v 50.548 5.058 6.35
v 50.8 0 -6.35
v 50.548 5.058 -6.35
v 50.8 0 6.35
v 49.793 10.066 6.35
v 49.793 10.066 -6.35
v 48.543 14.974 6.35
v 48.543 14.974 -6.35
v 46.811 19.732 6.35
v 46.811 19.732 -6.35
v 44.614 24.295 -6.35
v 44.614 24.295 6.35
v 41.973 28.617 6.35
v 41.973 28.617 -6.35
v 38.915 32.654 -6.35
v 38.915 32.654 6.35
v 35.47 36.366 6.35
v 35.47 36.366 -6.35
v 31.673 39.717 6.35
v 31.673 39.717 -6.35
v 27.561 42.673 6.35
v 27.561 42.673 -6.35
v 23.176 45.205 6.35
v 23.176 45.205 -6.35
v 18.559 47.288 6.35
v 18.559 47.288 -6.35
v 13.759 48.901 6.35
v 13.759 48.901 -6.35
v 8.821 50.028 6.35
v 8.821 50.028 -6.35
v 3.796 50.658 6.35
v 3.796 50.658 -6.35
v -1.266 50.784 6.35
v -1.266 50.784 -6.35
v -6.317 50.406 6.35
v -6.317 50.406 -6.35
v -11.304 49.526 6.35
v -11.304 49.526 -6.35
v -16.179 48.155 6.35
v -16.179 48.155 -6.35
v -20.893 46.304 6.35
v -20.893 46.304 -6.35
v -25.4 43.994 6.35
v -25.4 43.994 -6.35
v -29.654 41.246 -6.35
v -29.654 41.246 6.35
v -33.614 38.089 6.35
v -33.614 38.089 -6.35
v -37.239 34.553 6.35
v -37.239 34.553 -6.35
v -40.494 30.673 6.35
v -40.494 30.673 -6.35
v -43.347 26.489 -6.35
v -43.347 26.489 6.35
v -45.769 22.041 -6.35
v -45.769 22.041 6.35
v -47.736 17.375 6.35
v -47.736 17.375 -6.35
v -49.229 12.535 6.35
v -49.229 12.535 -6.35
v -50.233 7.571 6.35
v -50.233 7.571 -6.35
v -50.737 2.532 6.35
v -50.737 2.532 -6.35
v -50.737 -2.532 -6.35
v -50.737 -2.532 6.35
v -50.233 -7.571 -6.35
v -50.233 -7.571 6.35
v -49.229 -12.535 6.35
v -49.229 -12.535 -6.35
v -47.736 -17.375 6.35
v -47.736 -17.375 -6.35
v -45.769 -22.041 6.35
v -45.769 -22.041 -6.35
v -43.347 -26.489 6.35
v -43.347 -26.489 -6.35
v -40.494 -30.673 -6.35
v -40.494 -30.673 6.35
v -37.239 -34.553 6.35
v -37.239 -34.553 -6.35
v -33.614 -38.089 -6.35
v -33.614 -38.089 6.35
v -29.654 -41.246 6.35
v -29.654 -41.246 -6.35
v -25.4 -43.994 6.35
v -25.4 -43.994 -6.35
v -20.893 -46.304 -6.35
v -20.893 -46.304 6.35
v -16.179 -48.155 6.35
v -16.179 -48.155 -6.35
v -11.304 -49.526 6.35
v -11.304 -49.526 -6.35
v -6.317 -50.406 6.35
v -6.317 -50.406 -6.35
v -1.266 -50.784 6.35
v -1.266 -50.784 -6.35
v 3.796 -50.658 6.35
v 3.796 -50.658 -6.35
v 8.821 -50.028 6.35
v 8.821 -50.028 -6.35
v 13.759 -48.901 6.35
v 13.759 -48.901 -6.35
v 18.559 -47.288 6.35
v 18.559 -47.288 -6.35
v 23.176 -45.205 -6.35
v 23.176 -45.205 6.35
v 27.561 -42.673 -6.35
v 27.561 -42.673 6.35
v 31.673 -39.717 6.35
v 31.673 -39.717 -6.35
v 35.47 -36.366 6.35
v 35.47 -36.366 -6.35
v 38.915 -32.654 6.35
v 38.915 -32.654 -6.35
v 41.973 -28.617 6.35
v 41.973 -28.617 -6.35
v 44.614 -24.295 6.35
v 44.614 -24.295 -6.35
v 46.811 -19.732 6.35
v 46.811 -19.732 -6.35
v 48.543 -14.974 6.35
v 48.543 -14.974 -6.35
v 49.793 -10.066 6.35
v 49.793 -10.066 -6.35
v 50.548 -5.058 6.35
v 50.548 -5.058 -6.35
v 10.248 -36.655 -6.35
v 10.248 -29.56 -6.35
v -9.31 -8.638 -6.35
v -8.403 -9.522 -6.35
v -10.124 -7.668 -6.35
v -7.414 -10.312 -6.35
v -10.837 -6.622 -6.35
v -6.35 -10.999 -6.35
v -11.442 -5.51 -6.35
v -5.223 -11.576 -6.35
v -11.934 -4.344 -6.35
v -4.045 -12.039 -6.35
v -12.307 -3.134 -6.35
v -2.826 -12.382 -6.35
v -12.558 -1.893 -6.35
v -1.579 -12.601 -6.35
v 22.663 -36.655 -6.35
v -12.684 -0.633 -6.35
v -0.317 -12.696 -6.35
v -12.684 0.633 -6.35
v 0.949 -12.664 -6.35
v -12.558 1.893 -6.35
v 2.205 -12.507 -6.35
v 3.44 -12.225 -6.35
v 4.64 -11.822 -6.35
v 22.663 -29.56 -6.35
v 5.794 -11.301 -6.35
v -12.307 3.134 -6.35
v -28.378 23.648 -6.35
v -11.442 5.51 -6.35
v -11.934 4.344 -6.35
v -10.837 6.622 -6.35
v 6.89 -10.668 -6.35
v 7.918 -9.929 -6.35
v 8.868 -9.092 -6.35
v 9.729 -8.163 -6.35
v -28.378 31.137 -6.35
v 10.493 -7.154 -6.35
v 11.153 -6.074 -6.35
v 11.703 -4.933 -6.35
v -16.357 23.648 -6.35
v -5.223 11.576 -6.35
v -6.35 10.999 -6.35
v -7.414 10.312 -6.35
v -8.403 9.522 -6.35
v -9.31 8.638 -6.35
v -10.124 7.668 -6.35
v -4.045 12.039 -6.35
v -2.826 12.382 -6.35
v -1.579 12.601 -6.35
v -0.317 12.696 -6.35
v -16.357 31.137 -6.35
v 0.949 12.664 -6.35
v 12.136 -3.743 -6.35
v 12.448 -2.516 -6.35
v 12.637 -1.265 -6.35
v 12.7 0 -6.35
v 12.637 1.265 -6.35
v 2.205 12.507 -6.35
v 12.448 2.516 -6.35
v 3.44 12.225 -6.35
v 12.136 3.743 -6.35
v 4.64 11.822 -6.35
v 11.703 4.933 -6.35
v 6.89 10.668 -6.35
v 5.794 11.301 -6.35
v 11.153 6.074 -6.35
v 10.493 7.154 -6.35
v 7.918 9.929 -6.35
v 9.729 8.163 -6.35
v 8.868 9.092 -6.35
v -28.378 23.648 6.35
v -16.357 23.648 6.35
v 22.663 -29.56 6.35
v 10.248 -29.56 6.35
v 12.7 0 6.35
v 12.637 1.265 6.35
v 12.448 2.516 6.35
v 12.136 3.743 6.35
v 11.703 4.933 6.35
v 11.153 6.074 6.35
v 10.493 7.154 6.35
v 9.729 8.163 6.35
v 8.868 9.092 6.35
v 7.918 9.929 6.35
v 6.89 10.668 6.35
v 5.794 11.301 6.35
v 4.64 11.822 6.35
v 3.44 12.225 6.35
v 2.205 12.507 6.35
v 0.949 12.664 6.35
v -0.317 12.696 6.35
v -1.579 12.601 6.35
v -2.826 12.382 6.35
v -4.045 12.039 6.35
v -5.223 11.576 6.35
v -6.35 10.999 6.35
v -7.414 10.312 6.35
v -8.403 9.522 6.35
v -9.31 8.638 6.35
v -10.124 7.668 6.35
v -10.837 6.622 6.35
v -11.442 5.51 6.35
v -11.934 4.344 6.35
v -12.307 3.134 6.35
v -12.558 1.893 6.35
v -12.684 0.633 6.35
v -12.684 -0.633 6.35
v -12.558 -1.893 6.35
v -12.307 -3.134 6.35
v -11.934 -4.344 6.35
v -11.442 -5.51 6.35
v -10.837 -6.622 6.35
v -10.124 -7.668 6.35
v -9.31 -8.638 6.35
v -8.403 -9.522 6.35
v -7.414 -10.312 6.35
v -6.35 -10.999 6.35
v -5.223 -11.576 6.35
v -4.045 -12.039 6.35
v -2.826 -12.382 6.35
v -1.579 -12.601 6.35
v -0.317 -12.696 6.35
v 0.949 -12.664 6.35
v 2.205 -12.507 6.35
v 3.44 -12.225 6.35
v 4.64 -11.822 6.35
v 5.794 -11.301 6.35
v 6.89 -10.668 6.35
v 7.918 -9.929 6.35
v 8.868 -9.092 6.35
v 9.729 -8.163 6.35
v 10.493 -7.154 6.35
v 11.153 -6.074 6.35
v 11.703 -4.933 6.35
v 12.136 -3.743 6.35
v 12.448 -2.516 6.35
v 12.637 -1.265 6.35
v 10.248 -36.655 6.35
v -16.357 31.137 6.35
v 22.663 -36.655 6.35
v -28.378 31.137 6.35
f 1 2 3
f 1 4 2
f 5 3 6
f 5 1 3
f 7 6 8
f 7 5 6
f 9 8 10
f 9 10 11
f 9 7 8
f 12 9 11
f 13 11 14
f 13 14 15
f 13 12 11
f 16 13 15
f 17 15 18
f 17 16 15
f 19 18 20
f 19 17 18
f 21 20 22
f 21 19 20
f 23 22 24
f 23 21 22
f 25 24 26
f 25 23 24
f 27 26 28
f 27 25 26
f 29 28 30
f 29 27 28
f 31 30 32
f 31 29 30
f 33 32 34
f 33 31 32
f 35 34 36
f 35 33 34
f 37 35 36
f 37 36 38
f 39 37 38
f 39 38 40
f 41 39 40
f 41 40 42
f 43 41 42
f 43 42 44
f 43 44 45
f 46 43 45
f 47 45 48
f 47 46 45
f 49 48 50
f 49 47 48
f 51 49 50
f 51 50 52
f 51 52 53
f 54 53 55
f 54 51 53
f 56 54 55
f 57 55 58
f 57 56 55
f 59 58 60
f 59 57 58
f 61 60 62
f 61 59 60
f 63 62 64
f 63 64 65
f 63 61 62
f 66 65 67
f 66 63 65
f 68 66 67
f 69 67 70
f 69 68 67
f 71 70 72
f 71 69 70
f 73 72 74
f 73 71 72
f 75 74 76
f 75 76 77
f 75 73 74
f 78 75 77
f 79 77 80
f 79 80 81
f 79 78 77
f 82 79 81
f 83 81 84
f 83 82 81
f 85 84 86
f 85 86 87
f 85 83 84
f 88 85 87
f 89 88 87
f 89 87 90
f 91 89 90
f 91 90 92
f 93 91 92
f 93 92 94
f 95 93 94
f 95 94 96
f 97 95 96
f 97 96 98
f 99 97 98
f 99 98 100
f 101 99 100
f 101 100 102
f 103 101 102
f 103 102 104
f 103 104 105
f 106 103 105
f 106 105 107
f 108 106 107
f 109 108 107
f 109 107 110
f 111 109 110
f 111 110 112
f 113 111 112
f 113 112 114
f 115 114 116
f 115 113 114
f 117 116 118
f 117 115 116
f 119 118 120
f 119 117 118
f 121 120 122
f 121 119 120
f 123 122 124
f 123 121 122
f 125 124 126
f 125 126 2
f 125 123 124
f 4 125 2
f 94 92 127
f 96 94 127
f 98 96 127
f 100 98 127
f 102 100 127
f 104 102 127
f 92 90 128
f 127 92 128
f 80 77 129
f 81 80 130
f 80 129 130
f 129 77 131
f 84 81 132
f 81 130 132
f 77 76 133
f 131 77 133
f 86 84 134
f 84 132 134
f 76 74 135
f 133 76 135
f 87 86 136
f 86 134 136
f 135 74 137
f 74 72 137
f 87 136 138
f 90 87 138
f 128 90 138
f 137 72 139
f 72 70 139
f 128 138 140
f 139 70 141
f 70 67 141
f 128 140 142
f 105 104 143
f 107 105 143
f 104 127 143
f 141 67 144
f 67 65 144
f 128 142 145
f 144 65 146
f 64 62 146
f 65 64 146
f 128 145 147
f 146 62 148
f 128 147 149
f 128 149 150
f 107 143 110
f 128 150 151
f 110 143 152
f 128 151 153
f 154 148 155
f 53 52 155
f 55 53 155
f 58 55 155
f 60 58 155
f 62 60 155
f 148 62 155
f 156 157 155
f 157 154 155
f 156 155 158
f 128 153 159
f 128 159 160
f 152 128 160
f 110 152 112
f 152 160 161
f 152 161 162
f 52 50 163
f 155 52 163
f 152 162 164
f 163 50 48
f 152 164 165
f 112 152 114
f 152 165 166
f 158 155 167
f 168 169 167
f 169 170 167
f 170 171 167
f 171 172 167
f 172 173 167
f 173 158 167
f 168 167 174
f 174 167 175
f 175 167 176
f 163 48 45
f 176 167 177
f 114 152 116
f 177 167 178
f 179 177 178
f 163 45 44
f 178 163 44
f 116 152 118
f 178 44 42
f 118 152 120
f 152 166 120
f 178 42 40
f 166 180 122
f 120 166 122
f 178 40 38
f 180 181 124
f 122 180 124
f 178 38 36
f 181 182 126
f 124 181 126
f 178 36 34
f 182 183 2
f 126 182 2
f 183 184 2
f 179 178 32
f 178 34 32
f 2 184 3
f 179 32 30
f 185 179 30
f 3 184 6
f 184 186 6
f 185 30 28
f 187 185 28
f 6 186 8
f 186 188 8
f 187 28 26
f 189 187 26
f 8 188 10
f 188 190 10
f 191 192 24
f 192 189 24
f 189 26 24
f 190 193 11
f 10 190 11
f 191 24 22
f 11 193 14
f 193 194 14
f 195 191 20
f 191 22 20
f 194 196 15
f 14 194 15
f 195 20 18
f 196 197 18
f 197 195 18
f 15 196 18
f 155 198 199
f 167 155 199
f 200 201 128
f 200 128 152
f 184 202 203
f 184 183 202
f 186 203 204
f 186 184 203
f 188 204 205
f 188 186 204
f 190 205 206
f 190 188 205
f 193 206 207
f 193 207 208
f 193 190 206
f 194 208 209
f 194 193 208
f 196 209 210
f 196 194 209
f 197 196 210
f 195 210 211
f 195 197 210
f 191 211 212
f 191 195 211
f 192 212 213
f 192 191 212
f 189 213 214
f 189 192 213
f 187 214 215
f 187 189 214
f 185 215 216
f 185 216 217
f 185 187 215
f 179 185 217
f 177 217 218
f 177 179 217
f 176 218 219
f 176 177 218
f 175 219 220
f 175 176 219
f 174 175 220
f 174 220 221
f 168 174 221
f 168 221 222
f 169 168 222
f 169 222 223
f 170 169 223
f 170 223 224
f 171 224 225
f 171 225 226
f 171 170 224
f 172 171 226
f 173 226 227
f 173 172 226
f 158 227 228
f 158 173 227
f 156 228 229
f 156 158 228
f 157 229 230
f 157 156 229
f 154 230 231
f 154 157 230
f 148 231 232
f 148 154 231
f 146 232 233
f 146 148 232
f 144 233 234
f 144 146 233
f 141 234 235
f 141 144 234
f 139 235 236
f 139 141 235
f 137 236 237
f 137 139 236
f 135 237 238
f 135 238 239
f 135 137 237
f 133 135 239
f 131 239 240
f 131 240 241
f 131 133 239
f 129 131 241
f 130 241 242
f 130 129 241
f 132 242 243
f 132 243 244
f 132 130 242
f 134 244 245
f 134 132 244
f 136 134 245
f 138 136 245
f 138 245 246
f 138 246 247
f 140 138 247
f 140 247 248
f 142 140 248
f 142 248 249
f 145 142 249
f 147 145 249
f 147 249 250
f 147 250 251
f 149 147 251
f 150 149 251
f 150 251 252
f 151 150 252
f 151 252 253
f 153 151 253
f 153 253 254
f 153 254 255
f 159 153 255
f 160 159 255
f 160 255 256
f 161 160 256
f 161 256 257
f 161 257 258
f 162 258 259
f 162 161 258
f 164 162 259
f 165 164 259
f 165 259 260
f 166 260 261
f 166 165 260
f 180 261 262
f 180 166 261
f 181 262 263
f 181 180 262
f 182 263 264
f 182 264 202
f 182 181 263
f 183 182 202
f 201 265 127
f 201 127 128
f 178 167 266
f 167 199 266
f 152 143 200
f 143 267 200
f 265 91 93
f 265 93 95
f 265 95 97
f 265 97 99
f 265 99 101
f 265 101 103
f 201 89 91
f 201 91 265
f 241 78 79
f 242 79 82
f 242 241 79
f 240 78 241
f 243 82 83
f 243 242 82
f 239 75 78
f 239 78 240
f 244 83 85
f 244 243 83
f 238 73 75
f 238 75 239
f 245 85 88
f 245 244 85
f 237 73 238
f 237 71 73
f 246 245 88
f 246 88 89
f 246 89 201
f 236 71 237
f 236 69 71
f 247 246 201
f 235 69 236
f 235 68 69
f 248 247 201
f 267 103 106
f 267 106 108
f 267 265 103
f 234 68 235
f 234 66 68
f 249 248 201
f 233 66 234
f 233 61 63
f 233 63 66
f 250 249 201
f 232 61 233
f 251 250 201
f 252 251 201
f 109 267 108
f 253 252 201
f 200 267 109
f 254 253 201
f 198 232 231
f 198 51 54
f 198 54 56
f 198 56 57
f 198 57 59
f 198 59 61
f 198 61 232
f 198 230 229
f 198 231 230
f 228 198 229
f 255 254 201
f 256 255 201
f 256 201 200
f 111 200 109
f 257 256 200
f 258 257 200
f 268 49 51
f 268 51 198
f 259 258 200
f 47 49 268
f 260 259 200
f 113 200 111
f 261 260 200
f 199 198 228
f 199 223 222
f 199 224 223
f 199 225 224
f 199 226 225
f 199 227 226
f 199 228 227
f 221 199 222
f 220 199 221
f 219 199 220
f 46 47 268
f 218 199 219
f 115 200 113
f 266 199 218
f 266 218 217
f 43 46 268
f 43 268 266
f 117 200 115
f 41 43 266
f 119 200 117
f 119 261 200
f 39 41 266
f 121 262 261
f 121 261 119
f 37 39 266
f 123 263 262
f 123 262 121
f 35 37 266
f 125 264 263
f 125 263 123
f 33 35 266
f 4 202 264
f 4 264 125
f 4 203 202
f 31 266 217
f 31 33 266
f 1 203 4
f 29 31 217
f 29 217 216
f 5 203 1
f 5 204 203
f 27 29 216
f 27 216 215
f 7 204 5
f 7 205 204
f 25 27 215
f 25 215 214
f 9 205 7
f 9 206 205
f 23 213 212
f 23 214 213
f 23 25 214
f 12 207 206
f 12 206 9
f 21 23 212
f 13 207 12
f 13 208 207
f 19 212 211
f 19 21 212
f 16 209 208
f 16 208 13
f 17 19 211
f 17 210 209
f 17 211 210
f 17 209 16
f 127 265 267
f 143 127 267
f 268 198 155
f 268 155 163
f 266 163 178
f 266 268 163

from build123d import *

# Parameters (mm, degrees)
F0_R     = 50.8
F0_R_2   = 12.7
F0_W     = 12.4153457582
F0_H     = 7.0944800973
F0_W_2   = 12.021208182
F0_H_2   = 7.4886232615
F1_DEPTH = 6.35


# Not quite as in the source:
# - a length typed as a fraction of an inch, garbled in the dataset ("3 / 203.2 mm" for 3/8 in), is restored


with BuildPart() as f1:
    # F0 (on Top) → F1 (new body, symmetric)
    with BuildSketch(Plane.XY):
        Circle(F0_R)
        Circle(F0_R_2, mode=Mode.SUBTRACT)
        with Locations((16.4552591741, -33.107586205)):
            Rectangle(F0_W, F0_H, mode=Mode.SUBTRACT)
        with Locations((-22.3673274741, 27.3925866932)):
            Rectangle(F0_W_2, F0_H_2, mode=Mode.SUBTRACT)
    extrude(amount=F1_DEPTH, both=True)


solid = f1.part
